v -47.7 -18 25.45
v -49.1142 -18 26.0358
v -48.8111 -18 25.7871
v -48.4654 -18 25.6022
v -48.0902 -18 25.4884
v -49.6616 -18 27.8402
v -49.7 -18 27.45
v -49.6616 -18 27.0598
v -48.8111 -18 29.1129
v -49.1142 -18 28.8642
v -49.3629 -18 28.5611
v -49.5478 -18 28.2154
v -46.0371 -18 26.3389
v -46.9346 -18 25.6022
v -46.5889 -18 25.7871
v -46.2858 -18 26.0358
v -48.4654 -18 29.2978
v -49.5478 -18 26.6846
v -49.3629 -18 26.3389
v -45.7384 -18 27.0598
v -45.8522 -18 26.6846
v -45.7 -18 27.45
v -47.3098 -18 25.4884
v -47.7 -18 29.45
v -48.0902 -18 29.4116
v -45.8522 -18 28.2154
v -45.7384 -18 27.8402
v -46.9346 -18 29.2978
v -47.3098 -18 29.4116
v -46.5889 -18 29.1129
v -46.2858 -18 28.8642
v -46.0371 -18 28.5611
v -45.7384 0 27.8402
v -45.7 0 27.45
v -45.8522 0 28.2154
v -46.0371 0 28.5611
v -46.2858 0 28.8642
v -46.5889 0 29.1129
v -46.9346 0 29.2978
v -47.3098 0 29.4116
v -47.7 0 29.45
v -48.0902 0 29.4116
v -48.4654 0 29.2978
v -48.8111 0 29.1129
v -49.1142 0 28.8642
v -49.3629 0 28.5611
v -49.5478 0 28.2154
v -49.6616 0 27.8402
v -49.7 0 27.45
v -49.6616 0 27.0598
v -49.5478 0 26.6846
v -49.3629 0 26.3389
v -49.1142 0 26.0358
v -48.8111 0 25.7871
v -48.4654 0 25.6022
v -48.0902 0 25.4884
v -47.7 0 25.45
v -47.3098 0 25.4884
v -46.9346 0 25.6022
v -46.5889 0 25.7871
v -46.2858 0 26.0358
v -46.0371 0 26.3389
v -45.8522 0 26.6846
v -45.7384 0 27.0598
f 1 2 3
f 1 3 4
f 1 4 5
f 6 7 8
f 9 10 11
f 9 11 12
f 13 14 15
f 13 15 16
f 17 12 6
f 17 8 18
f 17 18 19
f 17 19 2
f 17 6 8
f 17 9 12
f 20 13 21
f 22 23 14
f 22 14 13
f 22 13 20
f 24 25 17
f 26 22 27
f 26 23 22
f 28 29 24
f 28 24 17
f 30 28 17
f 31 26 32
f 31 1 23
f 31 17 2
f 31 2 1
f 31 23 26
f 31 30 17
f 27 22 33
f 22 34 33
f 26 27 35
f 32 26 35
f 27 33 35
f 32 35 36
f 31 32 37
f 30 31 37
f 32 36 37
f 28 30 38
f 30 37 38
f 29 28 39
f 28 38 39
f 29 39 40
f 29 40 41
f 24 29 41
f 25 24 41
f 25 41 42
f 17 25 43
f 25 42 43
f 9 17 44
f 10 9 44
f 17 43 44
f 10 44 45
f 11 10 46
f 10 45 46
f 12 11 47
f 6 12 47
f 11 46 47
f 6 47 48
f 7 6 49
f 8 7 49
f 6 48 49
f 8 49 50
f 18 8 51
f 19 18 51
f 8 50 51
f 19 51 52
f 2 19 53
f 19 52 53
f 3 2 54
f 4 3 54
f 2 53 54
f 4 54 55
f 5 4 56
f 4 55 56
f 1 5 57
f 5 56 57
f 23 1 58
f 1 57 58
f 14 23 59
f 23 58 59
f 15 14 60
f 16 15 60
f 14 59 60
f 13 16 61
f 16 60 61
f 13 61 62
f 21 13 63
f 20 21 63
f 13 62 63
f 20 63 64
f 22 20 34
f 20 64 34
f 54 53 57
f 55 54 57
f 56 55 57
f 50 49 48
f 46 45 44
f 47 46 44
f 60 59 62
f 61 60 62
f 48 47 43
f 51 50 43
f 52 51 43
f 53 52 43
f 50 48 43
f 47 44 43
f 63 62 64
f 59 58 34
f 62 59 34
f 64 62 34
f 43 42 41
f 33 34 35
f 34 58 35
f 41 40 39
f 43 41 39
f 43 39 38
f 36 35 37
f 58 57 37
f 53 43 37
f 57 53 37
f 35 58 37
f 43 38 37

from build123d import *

# Parameters (mm, degrees)
F0_R     = 2
F1_DEPTH = 63
F2_DEPTH = 50
F3_DEPTH = 15
F4_DEPTH = 10
F5_DEPTH = 1
F6_DEPTH = 1
F7_DEPTH = 5
F8_DEPTH = 3


with BuildPart() as f1:
    # F0 (on Front) → F1 (new body)
    with BuildSketch(Plane.XZ):
        with Locations((-47.7000027895, 27.4500008672)):
            Circle(F0_R)
    extrude(amount=F1_DEPTH)

    # F2 (cut): a face of the model
    f2_faces = [f1.faces().sort_by_distance(p)[0] for p in [
        (-47.7000027895, -63, 27.4500008672),
    ]]
    extrude(f2_faces, amount=-F2_DEPTH, mode=Mode.SUBTRACT)

    # F3 (add): a face of the model
    f3_faces = [f1.faces().sort_by_distance(p)[0] for p in [
        (-47.7000027895, -13, 27.4500008672),
    ]]
    extrude(f3_faces, amount=F3_DEPTH)

    # F4 (cut): a face of the model
    f4_faces = [f1.faces().sort_by_distance(p)[0] for p in [
        (-47.7000027895, -28, 27.4500008672),
    ]]
    extrude(f4_faces, amount=-F4_DEPTH, mode=Mode.SUBTRACT)

    # F5 (cut): a face of the model
    f5_faces = [f1.faces().sort_by_distance(p)[0] for p in [
        (-47.7000027895, -18, 27.4500008672),
    ]]
    extrude(f5_faces, amount=-F5_DEPTH, mode=Mode.SUBTRACT)

    # F6 (cut): a face of the model
    f6_faces = [f1.faces().sort_by_distance(p)[0] for p in [
        (-47.7000027895, -17, 27.4500008672),
    ]]
    extrude(f6_faces, amount=-F6_DEPTH, mode=Mode.SUBTRACT)

    # F7 (add): a face of the model
    f7_faces = [f1.faces().sort_by_distance(p)[0] for p in [
        (-47.7000027895, -16, 27.4500008672),
    ]]
    extrude(f7_faces, amount=F7_DEPTH)

    # F8 (cut): a face of the model
    f8_faces = [f1.faces().sort_by_distance(p)[0] for p in [
        (-47.7000027895, -21, 27.4500008672),
    ]]
    extrude(f8_faces, amount=-F8_DEPTH, mode=Mode.SUBTRACT)


solid = f1.part
